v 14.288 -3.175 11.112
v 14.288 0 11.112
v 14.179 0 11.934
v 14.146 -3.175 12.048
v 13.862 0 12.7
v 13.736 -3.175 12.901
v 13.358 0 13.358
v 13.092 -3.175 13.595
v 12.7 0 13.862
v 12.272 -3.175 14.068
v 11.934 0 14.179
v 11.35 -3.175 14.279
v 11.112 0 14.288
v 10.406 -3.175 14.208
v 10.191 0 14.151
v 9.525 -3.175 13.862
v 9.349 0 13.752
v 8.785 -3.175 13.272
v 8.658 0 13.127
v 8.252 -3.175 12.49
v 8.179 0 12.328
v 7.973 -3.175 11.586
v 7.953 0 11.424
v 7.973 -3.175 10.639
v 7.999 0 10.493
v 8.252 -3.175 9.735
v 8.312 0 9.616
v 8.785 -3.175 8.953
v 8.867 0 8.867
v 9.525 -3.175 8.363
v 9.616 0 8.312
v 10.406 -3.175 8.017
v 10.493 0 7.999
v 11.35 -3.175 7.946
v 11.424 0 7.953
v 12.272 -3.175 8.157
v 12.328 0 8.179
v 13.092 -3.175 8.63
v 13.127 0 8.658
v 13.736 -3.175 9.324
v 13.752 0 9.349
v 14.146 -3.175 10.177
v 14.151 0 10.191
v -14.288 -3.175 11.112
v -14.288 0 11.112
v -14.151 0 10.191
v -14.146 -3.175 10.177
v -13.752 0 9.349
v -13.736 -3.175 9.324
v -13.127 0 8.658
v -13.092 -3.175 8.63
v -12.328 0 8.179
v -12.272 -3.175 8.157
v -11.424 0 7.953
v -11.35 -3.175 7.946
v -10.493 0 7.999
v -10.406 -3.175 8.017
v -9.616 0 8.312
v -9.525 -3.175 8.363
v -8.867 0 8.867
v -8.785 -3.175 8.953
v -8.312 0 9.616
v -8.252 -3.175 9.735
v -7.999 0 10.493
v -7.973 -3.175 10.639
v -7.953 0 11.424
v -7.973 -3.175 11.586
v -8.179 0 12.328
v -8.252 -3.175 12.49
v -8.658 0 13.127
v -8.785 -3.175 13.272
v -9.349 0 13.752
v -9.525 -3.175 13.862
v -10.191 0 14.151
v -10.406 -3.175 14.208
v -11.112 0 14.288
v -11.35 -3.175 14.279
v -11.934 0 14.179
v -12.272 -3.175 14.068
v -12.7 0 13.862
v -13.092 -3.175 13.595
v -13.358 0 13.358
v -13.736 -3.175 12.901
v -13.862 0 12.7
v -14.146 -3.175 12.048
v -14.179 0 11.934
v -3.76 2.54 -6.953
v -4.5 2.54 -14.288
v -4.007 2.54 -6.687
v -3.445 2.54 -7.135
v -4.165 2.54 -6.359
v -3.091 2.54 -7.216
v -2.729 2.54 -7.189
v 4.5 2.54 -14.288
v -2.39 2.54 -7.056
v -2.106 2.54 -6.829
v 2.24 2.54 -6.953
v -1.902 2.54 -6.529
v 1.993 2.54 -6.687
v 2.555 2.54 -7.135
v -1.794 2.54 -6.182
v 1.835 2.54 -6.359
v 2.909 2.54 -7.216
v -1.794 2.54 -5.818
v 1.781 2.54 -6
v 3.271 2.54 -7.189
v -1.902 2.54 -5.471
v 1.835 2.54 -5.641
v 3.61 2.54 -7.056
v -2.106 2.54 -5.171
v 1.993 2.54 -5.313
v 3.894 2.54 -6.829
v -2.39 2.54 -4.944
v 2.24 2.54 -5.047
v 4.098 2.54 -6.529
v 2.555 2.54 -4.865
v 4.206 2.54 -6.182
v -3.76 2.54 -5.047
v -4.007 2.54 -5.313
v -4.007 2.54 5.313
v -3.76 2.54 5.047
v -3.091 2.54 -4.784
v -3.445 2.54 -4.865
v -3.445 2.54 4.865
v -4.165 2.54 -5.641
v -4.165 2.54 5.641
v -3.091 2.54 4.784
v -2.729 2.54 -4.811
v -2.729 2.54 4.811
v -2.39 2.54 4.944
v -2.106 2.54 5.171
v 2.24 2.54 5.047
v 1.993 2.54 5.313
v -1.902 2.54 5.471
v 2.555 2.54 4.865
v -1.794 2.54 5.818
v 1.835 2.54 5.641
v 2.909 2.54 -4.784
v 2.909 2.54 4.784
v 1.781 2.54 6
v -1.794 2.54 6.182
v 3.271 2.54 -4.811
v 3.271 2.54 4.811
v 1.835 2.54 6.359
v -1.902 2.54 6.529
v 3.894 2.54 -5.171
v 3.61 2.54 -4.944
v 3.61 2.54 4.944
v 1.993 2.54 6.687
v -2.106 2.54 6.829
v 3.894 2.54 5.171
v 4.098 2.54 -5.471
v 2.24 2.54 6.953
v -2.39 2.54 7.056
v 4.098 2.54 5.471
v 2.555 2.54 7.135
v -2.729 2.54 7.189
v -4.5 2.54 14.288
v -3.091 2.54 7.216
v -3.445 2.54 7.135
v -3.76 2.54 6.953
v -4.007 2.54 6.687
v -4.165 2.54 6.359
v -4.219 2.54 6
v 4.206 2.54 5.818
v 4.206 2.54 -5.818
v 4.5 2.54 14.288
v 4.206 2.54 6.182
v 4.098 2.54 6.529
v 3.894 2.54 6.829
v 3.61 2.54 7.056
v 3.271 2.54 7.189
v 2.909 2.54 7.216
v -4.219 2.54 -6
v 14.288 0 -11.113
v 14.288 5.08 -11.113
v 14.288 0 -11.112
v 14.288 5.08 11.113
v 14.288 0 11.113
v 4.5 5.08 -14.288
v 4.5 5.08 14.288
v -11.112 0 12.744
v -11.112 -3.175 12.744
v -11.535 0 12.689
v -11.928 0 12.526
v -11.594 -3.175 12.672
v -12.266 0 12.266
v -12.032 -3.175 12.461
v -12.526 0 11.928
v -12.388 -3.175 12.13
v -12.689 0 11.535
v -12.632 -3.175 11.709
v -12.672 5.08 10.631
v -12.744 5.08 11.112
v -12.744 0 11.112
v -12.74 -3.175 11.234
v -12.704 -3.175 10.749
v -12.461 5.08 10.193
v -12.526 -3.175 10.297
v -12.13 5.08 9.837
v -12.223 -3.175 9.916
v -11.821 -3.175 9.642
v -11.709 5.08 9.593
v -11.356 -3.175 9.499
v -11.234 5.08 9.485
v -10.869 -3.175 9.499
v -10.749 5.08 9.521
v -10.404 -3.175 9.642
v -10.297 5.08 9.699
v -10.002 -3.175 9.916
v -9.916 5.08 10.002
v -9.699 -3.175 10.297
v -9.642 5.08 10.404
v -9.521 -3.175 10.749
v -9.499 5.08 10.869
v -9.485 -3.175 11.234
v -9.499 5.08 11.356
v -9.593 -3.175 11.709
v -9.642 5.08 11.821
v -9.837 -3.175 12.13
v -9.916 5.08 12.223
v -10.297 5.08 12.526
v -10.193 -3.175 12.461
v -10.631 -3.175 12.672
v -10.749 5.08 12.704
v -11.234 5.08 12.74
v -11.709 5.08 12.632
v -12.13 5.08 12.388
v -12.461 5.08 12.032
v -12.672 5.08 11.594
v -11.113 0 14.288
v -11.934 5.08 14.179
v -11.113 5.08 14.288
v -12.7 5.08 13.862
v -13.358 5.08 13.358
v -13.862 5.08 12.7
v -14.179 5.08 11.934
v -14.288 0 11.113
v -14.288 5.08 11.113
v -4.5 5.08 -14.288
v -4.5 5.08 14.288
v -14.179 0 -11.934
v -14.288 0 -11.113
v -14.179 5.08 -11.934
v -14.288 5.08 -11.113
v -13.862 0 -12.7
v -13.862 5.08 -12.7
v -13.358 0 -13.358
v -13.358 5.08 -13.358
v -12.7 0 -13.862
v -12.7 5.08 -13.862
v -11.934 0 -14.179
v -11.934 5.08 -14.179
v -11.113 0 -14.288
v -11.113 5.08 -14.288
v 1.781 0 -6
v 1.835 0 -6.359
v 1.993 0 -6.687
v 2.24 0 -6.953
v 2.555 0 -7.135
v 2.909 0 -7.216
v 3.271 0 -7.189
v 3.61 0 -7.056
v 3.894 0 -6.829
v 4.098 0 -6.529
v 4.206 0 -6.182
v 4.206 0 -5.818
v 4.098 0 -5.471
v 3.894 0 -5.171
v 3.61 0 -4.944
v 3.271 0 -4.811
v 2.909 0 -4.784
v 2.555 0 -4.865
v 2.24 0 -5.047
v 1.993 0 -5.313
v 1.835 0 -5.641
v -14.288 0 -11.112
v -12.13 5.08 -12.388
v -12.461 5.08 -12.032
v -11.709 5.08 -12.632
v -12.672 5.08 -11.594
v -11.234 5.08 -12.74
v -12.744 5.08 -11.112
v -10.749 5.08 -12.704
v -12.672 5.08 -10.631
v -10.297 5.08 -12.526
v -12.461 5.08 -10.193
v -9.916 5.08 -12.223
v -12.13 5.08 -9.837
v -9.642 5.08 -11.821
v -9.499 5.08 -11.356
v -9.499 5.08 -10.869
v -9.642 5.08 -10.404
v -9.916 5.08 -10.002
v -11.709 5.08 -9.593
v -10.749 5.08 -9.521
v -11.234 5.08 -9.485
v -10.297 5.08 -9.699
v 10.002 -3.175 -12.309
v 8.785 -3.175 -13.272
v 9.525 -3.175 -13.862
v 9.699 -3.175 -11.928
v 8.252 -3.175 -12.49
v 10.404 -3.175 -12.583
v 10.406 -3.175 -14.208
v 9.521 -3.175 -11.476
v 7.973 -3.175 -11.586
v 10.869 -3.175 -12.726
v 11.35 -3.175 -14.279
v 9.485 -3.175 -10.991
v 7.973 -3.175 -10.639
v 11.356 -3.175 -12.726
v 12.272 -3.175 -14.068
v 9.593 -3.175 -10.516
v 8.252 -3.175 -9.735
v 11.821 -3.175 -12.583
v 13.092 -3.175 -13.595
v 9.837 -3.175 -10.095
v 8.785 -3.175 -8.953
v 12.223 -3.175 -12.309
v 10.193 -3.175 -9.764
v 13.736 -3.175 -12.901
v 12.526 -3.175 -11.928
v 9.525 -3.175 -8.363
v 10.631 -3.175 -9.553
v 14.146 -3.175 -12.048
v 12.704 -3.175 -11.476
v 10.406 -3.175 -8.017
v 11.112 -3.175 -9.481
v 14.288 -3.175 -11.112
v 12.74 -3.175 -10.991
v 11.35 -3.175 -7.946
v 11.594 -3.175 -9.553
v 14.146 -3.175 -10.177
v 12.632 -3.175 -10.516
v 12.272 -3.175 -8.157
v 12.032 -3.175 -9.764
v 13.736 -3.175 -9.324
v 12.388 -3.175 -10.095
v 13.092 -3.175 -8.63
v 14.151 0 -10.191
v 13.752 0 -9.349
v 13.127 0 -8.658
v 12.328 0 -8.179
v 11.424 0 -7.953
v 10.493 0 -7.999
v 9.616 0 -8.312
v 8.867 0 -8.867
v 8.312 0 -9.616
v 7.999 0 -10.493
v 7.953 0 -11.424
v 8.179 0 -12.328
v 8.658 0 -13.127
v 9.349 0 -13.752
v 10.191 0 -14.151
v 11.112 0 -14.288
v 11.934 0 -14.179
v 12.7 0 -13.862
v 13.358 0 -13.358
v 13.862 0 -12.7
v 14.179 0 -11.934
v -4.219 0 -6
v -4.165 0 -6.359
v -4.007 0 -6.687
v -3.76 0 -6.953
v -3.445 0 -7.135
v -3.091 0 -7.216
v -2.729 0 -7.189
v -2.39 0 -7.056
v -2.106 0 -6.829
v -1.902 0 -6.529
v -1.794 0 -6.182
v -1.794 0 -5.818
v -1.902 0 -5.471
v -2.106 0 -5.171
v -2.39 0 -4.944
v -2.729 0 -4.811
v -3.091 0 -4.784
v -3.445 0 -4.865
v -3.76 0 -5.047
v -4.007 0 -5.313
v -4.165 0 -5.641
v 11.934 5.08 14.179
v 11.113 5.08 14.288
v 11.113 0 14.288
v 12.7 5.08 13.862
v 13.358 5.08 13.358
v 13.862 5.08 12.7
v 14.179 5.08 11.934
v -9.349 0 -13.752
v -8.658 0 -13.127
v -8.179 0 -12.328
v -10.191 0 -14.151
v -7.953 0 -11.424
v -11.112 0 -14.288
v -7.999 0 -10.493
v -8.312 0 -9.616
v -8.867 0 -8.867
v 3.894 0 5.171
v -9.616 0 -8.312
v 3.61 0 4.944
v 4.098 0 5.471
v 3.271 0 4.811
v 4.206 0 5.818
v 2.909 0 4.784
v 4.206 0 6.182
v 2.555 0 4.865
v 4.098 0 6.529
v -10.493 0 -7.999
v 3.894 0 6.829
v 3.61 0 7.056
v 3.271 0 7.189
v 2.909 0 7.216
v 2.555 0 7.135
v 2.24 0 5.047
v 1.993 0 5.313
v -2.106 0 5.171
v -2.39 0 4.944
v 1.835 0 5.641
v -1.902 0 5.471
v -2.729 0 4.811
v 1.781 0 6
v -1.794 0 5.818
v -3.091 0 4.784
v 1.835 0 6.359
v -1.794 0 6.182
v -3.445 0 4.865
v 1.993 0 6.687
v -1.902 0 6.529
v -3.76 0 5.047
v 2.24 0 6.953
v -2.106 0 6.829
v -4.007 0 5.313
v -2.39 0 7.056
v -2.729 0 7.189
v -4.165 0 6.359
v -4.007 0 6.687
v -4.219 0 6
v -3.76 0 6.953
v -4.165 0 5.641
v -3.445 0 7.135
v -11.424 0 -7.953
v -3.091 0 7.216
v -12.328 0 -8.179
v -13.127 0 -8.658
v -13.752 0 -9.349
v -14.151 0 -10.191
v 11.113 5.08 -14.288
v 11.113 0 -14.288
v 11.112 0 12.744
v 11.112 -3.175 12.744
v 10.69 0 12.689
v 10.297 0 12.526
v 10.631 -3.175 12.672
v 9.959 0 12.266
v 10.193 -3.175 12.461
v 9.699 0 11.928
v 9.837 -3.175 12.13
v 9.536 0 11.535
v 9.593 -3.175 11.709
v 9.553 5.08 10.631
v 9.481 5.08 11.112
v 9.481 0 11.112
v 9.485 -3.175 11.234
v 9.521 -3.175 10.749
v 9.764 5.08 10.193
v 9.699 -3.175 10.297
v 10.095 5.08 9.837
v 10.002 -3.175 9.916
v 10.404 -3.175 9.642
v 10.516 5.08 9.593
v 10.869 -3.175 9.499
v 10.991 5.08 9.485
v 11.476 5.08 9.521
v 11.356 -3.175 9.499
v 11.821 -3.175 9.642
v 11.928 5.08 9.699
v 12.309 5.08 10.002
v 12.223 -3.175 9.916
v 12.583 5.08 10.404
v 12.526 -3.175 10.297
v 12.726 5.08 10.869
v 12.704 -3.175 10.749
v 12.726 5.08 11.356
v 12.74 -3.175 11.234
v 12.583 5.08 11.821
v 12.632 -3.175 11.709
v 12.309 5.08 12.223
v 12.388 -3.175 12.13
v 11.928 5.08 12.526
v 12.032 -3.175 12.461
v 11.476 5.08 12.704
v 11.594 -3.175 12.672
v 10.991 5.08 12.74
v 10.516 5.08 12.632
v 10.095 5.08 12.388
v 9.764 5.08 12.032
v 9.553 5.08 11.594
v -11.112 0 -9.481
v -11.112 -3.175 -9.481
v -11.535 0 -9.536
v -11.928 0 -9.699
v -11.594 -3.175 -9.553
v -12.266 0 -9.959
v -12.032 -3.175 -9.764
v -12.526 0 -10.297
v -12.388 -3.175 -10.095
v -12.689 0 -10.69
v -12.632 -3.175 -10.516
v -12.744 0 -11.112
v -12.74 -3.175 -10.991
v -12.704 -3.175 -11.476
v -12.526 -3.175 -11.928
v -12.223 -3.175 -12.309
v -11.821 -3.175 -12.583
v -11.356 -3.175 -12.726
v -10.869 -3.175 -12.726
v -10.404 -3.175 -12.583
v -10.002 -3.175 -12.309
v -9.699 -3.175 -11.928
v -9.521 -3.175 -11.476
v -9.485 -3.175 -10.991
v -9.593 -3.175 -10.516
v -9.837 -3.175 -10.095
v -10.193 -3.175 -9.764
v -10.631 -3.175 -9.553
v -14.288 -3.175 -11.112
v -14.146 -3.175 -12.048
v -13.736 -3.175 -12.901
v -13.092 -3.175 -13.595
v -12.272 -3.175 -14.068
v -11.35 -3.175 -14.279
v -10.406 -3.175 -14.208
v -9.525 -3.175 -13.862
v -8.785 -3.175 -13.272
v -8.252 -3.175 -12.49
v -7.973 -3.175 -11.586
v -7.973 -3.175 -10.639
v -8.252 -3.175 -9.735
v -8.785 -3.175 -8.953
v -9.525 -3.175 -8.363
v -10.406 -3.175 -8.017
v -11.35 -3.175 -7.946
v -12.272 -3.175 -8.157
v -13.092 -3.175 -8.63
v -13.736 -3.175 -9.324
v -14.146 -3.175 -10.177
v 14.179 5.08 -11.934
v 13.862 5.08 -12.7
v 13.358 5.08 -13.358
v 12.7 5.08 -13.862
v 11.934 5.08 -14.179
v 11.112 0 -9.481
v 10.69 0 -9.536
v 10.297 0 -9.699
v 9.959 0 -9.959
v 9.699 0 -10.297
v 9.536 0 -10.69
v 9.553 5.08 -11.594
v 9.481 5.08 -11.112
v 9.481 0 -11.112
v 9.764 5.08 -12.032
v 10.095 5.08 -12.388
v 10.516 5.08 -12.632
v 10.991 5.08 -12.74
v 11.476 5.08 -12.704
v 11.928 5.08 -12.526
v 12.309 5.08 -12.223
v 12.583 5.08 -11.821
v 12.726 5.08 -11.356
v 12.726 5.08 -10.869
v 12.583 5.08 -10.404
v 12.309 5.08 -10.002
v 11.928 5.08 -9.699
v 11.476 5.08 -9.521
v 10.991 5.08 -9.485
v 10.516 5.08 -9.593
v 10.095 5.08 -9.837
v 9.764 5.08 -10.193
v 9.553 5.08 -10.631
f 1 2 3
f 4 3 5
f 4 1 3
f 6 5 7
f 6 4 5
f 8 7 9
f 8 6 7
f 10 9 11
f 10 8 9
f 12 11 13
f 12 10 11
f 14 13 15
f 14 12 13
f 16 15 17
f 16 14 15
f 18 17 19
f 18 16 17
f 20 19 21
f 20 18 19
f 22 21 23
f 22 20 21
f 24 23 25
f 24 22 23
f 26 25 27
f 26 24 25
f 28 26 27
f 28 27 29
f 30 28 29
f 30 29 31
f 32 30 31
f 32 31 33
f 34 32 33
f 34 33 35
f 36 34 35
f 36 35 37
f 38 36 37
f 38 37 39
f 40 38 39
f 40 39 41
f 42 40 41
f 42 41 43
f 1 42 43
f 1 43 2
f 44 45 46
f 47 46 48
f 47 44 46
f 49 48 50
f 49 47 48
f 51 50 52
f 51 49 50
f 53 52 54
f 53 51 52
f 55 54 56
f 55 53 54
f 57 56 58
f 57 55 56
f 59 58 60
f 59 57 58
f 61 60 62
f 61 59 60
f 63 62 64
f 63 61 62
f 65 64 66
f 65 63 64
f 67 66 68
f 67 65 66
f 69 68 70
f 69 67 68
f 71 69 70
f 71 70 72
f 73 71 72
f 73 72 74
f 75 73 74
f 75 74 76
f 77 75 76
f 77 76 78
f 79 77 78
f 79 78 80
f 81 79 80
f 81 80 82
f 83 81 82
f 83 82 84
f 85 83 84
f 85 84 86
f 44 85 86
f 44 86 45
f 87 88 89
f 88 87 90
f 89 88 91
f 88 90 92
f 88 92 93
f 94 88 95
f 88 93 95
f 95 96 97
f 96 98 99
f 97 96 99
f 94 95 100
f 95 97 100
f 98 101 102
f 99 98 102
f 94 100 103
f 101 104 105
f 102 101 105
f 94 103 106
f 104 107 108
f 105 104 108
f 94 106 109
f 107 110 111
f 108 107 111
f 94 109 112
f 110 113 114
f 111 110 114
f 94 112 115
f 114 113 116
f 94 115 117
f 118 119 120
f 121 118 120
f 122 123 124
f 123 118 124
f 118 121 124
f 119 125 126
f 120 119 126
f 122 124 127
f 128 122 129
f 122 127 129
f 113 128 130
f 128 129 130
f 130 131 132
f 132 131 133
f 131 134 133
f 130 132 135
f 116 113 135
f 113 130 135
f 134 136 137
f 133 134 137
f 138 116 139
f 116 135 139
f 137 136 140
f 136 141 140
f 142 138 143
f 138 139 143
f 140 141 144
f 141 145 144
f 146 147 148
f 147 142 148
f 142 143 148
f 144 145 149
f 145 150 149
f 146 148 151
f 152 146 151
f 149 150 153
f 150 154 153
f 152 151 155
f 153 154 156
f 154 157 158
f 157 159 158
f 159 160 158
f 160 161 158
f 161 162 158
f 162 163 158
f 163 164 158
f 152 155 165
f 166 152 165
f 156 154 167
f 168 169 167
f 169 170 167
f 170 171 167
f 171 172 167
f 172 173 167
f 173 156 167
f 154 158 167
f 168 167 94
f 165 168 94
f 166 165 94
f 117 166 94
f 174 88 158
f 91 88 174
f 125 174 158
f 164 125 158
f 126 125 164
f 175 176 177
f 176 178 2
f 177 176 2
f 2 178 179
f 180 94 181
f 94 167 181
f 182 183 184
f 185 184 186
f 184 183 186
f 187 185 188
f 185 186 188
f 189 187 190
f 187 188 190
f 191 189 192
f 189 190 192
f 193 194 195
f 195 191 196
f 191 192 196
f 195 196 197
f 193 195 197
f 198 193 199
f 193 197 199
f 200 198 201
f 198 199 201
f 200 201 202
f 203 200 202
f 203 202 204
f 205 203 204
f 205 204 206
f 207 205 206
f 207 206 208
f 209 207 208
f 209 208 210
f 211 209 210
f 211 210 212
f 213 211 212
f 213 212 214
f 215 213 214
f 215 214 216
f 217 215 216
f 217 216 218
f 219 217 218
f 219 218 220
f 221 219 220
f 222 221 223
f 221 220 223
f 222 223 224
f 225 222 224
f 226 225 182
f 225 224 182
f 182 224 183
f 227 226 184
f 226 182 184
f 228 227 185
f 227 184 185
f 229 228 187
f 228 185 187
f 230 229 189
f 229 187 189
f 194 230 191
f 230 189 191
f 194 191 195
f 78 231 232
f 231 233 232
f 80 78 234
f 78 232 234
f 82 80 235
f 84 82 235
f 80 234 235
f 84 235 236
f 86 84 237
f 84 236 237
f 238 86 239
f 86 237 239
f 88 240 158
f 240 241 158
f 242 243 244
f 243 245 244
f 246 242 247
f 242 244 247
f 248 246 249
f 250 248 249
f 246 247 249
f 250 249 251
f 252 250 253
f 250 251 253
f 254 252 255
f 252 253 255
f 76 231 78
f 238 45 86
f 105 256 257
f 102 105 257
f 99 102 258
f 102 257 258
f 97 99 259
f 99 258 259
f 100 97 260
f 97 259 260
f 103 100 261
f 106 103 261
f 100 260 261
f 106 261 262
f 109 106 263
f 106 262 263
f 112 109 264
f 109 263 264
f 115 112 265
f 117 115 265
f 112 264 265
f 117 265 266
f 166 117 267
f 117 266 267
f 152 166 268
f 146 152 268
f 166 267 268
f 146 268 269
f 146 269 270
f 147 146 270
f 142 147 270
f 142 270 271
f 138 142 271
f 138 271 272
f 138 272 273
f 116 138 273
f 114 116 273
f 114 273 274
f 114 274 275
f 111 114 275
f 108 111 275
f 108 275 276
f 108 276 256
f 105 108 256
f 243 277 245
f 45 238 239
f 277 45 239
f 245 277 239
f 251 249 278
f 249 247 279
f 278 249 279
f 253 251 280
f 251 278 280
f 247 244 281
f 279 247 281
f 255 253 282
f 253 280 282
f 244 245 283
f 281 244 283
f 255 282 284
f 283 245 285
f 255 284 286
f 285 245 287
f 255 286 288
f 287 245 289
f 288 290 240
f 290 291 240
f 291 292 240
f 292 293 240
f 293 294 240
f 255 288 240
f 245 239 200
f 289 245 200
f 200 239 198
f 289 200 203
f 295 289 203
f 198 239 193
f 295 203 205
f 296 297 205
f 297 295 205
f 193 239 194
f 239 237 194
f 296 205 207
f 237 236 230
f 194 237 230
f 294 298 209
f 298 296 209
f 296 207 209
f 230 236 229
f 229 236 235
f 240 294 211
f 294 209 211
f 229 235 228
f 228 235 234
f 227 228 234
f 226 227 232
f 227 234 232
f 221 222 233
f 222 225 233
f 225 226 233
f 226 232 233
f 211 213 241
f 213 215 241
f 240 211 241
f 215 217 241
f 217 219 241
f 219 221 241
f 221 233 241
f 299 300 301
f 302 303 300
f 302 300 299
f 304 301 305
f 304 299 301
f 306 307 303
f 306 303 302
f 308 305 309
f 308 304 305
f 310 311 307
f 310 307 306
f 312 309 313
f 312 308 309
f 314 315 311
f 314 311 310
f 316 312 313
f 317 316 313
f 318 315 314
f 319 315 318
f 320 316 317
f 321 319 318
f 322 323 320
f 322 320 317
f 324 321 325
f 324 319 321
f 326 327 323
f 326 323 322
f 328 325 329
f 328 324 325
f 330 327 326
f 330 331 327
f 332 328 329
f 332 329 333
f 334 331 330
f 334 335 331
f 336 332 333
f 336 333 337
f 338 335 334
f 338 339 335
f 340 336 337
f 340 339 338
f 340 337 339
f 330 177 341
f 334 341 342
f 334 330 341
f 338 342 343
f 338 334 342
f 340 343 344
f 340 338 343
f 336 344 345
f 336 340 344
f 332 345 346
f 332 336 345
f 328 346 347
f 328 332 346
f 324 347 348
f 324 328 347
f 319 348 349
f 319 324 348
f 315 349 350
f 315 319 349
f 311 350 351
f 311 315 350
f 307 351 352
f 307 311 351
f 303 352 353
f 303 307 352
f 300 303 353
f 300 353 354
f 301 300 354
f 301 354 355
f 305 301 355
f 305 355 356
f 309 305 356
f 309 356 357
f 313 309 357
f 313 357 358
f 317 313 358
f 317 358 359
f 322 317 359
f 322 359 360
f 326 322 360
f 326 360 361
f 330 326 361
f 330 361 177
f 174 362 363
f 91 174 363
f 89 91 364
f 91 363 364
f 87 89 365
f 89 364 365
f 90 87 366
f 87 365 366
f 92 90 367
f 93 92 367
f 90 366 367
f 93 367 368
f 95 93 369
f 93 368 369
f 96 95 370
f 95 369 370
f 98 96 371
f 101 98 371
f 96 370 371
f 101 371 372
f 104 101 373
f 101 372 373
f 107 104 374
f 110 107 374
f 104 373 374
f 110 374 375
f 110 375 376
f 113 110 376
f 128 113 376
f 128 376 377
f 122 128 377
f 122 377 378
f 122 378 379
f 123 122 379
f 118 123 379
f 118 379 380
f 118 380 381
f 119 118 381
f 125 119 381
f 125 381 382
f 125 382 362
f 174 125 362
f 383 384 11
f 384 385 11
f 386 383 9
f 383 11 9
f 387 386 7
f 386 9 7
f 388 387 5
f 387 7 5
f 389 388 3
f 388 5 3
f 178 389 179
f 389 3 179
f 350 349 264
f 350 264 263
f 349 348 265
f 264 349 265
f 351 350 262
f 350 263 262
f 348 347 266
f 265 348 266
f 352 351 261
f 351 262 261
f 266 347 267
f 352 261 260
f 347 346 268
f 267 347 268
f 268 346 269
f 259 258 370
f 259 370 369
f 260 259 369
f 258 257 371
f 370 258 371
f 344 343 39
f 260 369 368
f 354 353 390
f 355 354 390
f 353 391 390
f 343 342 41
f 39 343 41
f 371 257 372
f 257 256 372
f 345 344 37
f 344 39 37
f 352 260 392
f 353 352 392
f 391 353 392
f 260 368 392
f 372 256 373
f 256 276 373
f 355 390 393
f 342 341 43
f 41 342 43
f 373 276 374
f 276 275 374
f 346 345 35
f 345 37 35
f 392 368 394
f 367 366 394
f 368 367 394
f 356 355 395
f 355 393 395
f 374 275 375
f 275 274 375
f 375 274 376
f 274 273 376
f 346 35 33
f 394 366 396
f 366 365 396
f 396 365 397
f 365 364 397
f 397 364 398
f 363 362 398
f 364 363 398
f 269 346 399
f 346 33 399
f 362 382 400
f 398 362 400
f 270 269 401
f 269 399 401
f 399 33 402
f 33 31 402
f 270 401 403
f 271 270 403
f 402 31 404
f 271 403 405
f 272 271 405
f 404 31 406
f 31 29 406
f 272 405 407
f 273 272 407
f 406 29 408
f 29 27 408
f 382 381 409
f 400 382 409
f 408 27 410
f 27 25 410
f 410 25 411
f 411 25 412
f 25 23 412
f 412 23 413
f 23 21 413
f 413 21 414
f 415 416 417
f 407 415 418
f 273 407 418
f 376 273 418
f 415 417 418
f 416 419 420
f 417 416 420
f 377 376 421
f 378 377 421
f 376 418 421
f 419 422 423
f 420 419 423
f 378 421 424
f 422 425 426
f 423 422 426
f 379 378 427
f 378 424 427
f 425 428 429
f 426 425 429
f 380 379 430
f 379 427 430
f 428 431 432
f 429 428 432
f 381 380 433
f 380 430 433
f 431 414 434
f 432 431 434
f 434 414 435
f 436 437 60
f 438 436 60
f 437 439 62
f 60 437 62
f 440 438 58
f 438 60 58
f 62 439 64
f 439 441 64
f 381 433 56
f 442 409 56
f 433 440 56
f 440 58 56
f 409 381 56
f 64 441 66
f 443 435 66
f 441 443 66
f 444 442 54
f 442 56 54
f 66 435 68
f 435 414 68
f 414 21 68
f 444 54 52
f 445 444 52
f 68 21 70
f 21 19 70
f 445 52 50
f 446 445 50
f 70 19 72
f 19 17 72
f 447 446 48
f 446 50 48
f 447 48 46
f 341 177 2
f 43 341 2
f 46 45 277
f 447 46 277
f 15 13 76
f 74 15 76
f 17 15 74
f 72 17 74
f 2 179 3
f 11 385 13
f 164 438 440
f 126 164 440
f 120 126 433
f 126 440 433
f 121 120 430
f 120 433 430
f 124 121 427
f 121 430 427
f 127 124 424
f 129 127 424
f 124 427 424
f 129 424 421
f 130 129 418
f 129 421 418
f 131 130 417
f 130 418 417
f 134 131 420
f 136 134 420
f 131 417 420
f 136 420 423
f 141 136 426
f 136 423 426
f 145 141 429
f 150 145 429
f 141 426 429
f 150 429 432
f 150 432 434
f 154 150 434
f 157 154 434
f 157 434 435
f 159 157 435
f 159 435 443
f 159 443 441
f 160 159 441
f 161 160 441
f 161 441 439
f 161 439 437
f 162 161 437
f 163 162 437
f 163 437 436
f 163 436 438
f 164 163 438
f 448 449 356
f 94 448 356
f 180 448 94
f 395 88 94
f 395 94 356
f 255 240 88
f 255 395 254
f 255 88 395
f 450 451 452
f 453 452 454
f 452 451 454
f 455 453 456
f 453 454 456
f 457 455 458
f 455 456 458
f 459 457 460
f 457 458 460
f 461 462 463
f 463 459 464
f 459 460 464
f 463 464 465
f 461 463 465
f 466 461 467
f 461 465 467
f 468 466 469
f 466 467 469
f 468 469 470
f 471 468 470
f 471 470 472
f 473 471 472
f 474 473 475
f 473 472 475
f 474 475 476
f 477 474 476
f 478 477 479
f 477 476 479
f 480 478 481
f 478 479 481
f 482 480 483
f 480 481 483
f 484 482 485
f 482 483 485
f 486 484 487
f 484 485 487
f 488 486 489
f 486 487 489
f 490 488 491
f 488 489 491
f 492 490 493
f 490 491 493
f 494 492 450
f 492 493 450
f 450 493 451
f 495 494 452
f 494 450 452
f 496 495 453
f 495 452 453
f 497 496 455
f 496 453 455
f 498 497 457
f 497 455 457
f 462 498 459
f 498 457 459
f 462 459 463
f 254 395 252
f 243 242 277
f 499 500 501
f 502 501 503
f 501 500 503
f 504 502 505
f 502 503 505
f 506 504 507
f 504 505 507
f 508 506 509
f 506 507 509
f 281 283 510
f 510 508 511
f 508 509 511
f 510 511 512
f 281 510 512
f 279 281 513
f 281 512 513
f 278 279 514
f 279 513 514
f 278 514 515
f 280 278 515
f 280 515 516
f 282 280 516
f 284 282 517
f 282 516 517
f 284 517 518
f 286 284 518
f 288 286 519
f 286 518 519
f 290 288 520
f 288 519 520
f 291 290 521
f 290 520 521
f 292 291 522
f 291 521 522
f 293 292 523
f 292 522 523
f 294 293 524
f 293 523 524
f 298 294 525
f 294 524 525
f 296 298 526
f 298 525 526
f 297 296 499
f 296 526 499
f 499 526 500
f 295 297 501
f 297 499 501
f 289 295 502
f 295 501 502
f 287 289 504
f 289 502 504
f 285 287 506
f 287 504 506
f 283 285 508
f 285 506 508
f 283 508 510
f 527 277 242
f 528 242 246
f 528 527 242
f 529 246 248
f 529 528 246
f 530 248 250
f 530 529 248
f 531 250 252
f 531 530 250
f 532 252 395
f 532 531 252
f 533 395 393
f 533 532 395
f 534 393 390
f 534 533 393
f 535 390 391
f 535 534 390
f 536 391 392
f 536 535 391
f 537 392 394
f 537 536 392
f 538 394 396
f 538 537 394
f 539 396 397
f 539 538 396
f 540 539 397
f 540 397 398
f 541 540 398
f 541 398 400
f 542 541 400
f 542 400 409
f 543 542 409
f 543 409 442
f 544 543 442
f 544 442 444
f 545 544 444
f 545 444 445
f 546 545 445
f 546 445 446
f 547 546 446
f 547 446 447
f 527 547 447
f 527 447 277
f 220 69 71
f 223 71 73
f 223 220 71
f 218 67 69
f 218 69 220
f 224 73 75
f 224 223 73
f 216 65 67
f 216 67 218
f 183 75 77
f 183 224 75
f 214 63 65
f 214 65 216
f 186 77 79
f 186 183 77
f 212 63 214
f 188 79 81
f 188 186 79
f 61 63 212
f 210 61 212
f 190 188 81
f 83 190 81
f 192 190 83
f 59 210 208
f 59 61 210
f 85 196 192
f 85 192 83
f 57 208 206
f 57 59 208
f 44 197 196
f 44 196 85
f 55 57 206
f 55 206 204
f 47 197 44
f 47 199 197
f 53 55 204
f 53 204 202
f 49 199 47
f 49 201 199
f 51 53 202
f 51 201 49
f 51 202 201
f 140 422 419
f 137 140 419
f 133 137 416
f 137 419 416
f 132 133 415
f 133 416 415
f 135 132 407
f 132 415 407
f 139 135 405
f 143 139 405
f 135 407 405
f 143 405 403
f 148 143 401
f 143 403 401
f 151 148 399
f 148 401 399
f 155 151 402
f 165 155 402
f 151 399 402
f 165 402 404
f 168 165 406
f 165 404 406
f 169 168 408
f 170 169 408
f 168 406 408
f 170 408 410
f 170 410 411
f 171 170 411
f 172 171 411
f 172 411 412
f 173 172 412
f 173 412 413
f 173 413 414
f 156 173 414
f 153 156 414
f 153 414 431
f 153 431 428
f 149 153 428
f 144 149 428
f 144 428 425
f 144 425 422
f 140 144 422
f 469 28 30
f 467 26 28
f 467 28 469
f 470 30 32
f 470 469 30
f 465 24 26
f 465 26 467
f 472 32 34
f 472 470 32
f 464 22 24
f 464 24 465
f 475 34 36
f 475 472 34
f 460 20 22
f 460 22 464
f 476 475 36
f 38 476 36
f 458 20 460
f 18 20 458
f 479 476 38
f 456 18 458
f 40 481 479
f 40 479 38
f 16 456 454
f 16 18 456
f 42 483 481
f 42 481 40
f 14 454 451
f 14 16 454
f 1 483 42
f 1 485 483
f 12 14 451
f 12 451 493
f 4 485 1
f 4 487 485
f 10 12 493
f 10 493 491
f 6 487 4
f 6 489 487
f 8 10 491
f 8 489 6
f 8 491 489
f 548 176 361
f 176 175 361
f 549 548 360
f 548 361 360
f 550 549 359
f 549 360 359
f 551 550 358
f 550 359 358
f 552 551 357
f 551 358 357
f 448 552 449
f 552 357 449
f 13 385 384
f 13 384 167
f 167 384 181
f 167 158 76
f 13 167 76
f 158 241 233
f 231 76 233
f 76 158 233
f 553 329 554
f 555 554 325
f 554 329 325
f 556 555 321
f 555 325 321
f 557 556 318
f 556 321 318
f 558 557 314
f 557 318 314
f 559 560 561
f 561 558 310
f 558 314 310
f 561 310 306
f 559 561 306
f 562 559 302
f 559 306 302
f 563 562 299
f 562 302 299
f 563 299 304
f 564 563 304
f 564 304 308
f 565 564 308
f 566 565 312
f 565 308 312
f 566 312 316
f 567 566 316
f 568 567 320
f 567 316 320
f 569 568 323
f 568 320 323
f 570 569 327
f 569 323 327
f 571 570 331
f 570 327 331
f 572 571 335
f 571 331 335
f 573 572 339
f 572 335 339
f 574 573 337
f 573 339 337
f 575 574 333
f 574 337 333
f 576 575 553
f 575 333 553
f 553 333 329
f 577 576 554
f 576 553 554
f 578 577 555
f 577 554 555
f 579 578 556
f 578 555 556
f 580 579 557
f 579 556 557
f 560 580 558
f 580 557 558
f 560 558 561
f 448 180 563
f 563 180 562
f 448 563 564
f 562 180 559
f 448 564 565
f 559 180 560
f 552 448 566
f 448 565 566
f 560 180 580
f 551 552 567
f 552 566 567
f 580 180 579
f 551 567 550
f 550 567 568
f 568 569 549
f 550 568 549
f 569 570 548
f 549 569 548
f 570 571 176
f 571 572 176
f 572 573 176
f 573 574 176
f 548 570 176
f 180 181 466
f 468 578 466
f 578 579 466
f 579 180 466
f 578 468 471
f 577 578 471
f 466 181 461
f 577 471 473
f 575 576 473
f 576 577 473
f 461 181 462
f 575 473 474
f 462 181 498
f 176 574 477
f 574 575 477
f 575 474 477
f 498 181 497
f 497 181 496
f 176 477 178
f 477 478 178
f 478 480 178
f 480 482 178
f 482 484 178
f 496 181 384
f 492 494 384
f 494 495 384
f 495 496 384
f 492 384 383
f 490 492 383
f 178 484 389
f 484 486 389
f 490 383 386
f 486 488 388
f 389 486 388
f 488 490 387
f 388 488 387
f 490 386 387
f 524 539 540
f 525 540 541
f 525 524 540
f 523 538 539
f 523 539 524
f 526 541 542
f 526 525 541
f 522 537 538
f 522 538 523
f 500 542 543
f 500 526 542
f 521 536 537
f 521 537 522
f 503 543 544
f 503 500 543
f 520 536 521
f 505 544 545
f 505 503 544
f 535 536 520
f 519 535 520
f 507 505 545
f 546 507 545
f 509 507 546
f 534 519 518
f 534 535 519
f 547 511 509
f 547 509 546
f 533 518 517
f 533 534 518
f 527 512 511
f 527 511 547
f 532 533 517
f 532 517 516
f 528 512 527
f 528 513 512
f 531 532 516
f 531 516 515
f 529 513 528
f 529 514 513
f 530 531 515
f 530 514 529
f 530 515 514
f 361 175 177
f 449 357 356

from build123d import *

# Parameters (mm, degrees)
BOSS_EXTRUDE1_DEPTH   = 14.2875
F_4_CLEARANCE_HOLE1_D = 3.2639
BOSS_EXTRUDE2_START   = 3.175
SKETCH6_R             = 3.175
SKETCH6_R_2           = 1.63195
BOSS_EXTRUDE2_DEPTH   = 3.175
FILLET1_R             = 3.175
F_2_CLEARANCE_HOLE2_D = 2.4384


with BuildPart() as part:
    # Sketch2 → Boss-Extrude1 (new, symmetric)
    with BuildSketch(Plane.XY):
        Polygon((-14.2875, 0), (-14.2875, 5.08), (-4.5, 5.08), (-4.5, 2.54), (4.5, 2.54), (4.5, 5.08), (14.2875, 5.08), (14.2875, 0), align=None)
    extrude(amount=BOSS_EXTRUDE1_DEPTH, both=True)

    # #4 Clearance Hole1 (through all)
    with Locations(Plane(origin=(0, 5.08, 0), x_dir=(1, 0, 0), z_dir=(0, 1, 0))):
        with Locations((-11.1125, 11.1125), (11.1125, -11.1125), (11.1125, 11.1125), (-11.1125, -11.1125)):
            Hole(F_4_CLEARANCE_HOLE1_D / 2)

    # Sketch6 → Boss-Extrude2 (add)
    # profile 1 of 4: a face of its own
    with BuildSketch(Plane.XZ.offset(BOSS_EXTRUDE2_START)):
        with Locations(Location((-11.1125, 11.1125, 0), (0, 0, 180))):
            Circle(SKETCH6_R)
        with Locations(Location((-11.1125, 11.1125, 0), (0, 0, 90))):
            Circle(SKETCH6_R_2, mode=Mode.SUBTRACT)
    # profile 2 of 4: a face of its own
    with BuildSketch(Plane.XZ.offset(BOSS_EXTRUDE2_START)):
        with Locations((11.1125, 11.1125)):
            Circle(SKETCH6_R)
        with Locations(Location((11.1125, 11.1125, 0), (0, 0, 90))):
            Circle(SKETCH6_R_2, mode=Mode.SUBTRACT)
    # profile 3 of 4: a face of its own
    with BuildSketch(Plane.XZ.offset(BOSS_EXTRUDE2_START)):
        with Locations((11.1125, -11.1125)):
            Circle(SKETCH6_R)
        with Locations(Location((11.1125, -11.1125, 0), (0, 0, 90))):
            Circle(SKETCH6_R_2, mode=Mode.SUBTRACT)
    # profile 4 of 4: a face of its own
    with BuildSketch(Plane.XZ.offset(BOSS_EXTRUDE2_START)):
        with Locations(Location((-11.1125, -11.1125, 0), (0, 0, 180))):
            Circle(SKETCH6_R)
        with Locations(Location((-11.1125, -11.1125, 0), (0, 0, 90))):
            Circle(SKETCH6_R_2, mode=Mode.SUBTRACT)
    extrude(amount=-BOSS_EXTRUDE2_DEPTH)

    # Fillet1
    fillet1_edges = [part.edges().sort_by_distance(p)[0] for p in [
        (-14.2875, 2.54, -14.2875),
        (-14.2875, 2.54, 14.2875),
        (14.2875, 2.54, -14.2875),
        (14.2875, 2.54, 14.2875),
    ]]
    fillet(fillet1_edges, radius=FILLET1_R - 0.0001)  # a hair under: the kernel refuses the full size

    # #2 Clearance Hole2 (through all)
    with Locations(Plane(origin=(0, 2.54, 0), x_dir=(1, 0, 0), z_dir=(0, 1, 0))):
        with Locations((-2.999999969, 5.999999938), (2.999999969, -5.999999938), (2.999999969, 5.999999938), (-2.999999969, -5.999999938)):
            Hole(F_2_CLEARANCE_HOLE2_D / 2)


solid = part.part
